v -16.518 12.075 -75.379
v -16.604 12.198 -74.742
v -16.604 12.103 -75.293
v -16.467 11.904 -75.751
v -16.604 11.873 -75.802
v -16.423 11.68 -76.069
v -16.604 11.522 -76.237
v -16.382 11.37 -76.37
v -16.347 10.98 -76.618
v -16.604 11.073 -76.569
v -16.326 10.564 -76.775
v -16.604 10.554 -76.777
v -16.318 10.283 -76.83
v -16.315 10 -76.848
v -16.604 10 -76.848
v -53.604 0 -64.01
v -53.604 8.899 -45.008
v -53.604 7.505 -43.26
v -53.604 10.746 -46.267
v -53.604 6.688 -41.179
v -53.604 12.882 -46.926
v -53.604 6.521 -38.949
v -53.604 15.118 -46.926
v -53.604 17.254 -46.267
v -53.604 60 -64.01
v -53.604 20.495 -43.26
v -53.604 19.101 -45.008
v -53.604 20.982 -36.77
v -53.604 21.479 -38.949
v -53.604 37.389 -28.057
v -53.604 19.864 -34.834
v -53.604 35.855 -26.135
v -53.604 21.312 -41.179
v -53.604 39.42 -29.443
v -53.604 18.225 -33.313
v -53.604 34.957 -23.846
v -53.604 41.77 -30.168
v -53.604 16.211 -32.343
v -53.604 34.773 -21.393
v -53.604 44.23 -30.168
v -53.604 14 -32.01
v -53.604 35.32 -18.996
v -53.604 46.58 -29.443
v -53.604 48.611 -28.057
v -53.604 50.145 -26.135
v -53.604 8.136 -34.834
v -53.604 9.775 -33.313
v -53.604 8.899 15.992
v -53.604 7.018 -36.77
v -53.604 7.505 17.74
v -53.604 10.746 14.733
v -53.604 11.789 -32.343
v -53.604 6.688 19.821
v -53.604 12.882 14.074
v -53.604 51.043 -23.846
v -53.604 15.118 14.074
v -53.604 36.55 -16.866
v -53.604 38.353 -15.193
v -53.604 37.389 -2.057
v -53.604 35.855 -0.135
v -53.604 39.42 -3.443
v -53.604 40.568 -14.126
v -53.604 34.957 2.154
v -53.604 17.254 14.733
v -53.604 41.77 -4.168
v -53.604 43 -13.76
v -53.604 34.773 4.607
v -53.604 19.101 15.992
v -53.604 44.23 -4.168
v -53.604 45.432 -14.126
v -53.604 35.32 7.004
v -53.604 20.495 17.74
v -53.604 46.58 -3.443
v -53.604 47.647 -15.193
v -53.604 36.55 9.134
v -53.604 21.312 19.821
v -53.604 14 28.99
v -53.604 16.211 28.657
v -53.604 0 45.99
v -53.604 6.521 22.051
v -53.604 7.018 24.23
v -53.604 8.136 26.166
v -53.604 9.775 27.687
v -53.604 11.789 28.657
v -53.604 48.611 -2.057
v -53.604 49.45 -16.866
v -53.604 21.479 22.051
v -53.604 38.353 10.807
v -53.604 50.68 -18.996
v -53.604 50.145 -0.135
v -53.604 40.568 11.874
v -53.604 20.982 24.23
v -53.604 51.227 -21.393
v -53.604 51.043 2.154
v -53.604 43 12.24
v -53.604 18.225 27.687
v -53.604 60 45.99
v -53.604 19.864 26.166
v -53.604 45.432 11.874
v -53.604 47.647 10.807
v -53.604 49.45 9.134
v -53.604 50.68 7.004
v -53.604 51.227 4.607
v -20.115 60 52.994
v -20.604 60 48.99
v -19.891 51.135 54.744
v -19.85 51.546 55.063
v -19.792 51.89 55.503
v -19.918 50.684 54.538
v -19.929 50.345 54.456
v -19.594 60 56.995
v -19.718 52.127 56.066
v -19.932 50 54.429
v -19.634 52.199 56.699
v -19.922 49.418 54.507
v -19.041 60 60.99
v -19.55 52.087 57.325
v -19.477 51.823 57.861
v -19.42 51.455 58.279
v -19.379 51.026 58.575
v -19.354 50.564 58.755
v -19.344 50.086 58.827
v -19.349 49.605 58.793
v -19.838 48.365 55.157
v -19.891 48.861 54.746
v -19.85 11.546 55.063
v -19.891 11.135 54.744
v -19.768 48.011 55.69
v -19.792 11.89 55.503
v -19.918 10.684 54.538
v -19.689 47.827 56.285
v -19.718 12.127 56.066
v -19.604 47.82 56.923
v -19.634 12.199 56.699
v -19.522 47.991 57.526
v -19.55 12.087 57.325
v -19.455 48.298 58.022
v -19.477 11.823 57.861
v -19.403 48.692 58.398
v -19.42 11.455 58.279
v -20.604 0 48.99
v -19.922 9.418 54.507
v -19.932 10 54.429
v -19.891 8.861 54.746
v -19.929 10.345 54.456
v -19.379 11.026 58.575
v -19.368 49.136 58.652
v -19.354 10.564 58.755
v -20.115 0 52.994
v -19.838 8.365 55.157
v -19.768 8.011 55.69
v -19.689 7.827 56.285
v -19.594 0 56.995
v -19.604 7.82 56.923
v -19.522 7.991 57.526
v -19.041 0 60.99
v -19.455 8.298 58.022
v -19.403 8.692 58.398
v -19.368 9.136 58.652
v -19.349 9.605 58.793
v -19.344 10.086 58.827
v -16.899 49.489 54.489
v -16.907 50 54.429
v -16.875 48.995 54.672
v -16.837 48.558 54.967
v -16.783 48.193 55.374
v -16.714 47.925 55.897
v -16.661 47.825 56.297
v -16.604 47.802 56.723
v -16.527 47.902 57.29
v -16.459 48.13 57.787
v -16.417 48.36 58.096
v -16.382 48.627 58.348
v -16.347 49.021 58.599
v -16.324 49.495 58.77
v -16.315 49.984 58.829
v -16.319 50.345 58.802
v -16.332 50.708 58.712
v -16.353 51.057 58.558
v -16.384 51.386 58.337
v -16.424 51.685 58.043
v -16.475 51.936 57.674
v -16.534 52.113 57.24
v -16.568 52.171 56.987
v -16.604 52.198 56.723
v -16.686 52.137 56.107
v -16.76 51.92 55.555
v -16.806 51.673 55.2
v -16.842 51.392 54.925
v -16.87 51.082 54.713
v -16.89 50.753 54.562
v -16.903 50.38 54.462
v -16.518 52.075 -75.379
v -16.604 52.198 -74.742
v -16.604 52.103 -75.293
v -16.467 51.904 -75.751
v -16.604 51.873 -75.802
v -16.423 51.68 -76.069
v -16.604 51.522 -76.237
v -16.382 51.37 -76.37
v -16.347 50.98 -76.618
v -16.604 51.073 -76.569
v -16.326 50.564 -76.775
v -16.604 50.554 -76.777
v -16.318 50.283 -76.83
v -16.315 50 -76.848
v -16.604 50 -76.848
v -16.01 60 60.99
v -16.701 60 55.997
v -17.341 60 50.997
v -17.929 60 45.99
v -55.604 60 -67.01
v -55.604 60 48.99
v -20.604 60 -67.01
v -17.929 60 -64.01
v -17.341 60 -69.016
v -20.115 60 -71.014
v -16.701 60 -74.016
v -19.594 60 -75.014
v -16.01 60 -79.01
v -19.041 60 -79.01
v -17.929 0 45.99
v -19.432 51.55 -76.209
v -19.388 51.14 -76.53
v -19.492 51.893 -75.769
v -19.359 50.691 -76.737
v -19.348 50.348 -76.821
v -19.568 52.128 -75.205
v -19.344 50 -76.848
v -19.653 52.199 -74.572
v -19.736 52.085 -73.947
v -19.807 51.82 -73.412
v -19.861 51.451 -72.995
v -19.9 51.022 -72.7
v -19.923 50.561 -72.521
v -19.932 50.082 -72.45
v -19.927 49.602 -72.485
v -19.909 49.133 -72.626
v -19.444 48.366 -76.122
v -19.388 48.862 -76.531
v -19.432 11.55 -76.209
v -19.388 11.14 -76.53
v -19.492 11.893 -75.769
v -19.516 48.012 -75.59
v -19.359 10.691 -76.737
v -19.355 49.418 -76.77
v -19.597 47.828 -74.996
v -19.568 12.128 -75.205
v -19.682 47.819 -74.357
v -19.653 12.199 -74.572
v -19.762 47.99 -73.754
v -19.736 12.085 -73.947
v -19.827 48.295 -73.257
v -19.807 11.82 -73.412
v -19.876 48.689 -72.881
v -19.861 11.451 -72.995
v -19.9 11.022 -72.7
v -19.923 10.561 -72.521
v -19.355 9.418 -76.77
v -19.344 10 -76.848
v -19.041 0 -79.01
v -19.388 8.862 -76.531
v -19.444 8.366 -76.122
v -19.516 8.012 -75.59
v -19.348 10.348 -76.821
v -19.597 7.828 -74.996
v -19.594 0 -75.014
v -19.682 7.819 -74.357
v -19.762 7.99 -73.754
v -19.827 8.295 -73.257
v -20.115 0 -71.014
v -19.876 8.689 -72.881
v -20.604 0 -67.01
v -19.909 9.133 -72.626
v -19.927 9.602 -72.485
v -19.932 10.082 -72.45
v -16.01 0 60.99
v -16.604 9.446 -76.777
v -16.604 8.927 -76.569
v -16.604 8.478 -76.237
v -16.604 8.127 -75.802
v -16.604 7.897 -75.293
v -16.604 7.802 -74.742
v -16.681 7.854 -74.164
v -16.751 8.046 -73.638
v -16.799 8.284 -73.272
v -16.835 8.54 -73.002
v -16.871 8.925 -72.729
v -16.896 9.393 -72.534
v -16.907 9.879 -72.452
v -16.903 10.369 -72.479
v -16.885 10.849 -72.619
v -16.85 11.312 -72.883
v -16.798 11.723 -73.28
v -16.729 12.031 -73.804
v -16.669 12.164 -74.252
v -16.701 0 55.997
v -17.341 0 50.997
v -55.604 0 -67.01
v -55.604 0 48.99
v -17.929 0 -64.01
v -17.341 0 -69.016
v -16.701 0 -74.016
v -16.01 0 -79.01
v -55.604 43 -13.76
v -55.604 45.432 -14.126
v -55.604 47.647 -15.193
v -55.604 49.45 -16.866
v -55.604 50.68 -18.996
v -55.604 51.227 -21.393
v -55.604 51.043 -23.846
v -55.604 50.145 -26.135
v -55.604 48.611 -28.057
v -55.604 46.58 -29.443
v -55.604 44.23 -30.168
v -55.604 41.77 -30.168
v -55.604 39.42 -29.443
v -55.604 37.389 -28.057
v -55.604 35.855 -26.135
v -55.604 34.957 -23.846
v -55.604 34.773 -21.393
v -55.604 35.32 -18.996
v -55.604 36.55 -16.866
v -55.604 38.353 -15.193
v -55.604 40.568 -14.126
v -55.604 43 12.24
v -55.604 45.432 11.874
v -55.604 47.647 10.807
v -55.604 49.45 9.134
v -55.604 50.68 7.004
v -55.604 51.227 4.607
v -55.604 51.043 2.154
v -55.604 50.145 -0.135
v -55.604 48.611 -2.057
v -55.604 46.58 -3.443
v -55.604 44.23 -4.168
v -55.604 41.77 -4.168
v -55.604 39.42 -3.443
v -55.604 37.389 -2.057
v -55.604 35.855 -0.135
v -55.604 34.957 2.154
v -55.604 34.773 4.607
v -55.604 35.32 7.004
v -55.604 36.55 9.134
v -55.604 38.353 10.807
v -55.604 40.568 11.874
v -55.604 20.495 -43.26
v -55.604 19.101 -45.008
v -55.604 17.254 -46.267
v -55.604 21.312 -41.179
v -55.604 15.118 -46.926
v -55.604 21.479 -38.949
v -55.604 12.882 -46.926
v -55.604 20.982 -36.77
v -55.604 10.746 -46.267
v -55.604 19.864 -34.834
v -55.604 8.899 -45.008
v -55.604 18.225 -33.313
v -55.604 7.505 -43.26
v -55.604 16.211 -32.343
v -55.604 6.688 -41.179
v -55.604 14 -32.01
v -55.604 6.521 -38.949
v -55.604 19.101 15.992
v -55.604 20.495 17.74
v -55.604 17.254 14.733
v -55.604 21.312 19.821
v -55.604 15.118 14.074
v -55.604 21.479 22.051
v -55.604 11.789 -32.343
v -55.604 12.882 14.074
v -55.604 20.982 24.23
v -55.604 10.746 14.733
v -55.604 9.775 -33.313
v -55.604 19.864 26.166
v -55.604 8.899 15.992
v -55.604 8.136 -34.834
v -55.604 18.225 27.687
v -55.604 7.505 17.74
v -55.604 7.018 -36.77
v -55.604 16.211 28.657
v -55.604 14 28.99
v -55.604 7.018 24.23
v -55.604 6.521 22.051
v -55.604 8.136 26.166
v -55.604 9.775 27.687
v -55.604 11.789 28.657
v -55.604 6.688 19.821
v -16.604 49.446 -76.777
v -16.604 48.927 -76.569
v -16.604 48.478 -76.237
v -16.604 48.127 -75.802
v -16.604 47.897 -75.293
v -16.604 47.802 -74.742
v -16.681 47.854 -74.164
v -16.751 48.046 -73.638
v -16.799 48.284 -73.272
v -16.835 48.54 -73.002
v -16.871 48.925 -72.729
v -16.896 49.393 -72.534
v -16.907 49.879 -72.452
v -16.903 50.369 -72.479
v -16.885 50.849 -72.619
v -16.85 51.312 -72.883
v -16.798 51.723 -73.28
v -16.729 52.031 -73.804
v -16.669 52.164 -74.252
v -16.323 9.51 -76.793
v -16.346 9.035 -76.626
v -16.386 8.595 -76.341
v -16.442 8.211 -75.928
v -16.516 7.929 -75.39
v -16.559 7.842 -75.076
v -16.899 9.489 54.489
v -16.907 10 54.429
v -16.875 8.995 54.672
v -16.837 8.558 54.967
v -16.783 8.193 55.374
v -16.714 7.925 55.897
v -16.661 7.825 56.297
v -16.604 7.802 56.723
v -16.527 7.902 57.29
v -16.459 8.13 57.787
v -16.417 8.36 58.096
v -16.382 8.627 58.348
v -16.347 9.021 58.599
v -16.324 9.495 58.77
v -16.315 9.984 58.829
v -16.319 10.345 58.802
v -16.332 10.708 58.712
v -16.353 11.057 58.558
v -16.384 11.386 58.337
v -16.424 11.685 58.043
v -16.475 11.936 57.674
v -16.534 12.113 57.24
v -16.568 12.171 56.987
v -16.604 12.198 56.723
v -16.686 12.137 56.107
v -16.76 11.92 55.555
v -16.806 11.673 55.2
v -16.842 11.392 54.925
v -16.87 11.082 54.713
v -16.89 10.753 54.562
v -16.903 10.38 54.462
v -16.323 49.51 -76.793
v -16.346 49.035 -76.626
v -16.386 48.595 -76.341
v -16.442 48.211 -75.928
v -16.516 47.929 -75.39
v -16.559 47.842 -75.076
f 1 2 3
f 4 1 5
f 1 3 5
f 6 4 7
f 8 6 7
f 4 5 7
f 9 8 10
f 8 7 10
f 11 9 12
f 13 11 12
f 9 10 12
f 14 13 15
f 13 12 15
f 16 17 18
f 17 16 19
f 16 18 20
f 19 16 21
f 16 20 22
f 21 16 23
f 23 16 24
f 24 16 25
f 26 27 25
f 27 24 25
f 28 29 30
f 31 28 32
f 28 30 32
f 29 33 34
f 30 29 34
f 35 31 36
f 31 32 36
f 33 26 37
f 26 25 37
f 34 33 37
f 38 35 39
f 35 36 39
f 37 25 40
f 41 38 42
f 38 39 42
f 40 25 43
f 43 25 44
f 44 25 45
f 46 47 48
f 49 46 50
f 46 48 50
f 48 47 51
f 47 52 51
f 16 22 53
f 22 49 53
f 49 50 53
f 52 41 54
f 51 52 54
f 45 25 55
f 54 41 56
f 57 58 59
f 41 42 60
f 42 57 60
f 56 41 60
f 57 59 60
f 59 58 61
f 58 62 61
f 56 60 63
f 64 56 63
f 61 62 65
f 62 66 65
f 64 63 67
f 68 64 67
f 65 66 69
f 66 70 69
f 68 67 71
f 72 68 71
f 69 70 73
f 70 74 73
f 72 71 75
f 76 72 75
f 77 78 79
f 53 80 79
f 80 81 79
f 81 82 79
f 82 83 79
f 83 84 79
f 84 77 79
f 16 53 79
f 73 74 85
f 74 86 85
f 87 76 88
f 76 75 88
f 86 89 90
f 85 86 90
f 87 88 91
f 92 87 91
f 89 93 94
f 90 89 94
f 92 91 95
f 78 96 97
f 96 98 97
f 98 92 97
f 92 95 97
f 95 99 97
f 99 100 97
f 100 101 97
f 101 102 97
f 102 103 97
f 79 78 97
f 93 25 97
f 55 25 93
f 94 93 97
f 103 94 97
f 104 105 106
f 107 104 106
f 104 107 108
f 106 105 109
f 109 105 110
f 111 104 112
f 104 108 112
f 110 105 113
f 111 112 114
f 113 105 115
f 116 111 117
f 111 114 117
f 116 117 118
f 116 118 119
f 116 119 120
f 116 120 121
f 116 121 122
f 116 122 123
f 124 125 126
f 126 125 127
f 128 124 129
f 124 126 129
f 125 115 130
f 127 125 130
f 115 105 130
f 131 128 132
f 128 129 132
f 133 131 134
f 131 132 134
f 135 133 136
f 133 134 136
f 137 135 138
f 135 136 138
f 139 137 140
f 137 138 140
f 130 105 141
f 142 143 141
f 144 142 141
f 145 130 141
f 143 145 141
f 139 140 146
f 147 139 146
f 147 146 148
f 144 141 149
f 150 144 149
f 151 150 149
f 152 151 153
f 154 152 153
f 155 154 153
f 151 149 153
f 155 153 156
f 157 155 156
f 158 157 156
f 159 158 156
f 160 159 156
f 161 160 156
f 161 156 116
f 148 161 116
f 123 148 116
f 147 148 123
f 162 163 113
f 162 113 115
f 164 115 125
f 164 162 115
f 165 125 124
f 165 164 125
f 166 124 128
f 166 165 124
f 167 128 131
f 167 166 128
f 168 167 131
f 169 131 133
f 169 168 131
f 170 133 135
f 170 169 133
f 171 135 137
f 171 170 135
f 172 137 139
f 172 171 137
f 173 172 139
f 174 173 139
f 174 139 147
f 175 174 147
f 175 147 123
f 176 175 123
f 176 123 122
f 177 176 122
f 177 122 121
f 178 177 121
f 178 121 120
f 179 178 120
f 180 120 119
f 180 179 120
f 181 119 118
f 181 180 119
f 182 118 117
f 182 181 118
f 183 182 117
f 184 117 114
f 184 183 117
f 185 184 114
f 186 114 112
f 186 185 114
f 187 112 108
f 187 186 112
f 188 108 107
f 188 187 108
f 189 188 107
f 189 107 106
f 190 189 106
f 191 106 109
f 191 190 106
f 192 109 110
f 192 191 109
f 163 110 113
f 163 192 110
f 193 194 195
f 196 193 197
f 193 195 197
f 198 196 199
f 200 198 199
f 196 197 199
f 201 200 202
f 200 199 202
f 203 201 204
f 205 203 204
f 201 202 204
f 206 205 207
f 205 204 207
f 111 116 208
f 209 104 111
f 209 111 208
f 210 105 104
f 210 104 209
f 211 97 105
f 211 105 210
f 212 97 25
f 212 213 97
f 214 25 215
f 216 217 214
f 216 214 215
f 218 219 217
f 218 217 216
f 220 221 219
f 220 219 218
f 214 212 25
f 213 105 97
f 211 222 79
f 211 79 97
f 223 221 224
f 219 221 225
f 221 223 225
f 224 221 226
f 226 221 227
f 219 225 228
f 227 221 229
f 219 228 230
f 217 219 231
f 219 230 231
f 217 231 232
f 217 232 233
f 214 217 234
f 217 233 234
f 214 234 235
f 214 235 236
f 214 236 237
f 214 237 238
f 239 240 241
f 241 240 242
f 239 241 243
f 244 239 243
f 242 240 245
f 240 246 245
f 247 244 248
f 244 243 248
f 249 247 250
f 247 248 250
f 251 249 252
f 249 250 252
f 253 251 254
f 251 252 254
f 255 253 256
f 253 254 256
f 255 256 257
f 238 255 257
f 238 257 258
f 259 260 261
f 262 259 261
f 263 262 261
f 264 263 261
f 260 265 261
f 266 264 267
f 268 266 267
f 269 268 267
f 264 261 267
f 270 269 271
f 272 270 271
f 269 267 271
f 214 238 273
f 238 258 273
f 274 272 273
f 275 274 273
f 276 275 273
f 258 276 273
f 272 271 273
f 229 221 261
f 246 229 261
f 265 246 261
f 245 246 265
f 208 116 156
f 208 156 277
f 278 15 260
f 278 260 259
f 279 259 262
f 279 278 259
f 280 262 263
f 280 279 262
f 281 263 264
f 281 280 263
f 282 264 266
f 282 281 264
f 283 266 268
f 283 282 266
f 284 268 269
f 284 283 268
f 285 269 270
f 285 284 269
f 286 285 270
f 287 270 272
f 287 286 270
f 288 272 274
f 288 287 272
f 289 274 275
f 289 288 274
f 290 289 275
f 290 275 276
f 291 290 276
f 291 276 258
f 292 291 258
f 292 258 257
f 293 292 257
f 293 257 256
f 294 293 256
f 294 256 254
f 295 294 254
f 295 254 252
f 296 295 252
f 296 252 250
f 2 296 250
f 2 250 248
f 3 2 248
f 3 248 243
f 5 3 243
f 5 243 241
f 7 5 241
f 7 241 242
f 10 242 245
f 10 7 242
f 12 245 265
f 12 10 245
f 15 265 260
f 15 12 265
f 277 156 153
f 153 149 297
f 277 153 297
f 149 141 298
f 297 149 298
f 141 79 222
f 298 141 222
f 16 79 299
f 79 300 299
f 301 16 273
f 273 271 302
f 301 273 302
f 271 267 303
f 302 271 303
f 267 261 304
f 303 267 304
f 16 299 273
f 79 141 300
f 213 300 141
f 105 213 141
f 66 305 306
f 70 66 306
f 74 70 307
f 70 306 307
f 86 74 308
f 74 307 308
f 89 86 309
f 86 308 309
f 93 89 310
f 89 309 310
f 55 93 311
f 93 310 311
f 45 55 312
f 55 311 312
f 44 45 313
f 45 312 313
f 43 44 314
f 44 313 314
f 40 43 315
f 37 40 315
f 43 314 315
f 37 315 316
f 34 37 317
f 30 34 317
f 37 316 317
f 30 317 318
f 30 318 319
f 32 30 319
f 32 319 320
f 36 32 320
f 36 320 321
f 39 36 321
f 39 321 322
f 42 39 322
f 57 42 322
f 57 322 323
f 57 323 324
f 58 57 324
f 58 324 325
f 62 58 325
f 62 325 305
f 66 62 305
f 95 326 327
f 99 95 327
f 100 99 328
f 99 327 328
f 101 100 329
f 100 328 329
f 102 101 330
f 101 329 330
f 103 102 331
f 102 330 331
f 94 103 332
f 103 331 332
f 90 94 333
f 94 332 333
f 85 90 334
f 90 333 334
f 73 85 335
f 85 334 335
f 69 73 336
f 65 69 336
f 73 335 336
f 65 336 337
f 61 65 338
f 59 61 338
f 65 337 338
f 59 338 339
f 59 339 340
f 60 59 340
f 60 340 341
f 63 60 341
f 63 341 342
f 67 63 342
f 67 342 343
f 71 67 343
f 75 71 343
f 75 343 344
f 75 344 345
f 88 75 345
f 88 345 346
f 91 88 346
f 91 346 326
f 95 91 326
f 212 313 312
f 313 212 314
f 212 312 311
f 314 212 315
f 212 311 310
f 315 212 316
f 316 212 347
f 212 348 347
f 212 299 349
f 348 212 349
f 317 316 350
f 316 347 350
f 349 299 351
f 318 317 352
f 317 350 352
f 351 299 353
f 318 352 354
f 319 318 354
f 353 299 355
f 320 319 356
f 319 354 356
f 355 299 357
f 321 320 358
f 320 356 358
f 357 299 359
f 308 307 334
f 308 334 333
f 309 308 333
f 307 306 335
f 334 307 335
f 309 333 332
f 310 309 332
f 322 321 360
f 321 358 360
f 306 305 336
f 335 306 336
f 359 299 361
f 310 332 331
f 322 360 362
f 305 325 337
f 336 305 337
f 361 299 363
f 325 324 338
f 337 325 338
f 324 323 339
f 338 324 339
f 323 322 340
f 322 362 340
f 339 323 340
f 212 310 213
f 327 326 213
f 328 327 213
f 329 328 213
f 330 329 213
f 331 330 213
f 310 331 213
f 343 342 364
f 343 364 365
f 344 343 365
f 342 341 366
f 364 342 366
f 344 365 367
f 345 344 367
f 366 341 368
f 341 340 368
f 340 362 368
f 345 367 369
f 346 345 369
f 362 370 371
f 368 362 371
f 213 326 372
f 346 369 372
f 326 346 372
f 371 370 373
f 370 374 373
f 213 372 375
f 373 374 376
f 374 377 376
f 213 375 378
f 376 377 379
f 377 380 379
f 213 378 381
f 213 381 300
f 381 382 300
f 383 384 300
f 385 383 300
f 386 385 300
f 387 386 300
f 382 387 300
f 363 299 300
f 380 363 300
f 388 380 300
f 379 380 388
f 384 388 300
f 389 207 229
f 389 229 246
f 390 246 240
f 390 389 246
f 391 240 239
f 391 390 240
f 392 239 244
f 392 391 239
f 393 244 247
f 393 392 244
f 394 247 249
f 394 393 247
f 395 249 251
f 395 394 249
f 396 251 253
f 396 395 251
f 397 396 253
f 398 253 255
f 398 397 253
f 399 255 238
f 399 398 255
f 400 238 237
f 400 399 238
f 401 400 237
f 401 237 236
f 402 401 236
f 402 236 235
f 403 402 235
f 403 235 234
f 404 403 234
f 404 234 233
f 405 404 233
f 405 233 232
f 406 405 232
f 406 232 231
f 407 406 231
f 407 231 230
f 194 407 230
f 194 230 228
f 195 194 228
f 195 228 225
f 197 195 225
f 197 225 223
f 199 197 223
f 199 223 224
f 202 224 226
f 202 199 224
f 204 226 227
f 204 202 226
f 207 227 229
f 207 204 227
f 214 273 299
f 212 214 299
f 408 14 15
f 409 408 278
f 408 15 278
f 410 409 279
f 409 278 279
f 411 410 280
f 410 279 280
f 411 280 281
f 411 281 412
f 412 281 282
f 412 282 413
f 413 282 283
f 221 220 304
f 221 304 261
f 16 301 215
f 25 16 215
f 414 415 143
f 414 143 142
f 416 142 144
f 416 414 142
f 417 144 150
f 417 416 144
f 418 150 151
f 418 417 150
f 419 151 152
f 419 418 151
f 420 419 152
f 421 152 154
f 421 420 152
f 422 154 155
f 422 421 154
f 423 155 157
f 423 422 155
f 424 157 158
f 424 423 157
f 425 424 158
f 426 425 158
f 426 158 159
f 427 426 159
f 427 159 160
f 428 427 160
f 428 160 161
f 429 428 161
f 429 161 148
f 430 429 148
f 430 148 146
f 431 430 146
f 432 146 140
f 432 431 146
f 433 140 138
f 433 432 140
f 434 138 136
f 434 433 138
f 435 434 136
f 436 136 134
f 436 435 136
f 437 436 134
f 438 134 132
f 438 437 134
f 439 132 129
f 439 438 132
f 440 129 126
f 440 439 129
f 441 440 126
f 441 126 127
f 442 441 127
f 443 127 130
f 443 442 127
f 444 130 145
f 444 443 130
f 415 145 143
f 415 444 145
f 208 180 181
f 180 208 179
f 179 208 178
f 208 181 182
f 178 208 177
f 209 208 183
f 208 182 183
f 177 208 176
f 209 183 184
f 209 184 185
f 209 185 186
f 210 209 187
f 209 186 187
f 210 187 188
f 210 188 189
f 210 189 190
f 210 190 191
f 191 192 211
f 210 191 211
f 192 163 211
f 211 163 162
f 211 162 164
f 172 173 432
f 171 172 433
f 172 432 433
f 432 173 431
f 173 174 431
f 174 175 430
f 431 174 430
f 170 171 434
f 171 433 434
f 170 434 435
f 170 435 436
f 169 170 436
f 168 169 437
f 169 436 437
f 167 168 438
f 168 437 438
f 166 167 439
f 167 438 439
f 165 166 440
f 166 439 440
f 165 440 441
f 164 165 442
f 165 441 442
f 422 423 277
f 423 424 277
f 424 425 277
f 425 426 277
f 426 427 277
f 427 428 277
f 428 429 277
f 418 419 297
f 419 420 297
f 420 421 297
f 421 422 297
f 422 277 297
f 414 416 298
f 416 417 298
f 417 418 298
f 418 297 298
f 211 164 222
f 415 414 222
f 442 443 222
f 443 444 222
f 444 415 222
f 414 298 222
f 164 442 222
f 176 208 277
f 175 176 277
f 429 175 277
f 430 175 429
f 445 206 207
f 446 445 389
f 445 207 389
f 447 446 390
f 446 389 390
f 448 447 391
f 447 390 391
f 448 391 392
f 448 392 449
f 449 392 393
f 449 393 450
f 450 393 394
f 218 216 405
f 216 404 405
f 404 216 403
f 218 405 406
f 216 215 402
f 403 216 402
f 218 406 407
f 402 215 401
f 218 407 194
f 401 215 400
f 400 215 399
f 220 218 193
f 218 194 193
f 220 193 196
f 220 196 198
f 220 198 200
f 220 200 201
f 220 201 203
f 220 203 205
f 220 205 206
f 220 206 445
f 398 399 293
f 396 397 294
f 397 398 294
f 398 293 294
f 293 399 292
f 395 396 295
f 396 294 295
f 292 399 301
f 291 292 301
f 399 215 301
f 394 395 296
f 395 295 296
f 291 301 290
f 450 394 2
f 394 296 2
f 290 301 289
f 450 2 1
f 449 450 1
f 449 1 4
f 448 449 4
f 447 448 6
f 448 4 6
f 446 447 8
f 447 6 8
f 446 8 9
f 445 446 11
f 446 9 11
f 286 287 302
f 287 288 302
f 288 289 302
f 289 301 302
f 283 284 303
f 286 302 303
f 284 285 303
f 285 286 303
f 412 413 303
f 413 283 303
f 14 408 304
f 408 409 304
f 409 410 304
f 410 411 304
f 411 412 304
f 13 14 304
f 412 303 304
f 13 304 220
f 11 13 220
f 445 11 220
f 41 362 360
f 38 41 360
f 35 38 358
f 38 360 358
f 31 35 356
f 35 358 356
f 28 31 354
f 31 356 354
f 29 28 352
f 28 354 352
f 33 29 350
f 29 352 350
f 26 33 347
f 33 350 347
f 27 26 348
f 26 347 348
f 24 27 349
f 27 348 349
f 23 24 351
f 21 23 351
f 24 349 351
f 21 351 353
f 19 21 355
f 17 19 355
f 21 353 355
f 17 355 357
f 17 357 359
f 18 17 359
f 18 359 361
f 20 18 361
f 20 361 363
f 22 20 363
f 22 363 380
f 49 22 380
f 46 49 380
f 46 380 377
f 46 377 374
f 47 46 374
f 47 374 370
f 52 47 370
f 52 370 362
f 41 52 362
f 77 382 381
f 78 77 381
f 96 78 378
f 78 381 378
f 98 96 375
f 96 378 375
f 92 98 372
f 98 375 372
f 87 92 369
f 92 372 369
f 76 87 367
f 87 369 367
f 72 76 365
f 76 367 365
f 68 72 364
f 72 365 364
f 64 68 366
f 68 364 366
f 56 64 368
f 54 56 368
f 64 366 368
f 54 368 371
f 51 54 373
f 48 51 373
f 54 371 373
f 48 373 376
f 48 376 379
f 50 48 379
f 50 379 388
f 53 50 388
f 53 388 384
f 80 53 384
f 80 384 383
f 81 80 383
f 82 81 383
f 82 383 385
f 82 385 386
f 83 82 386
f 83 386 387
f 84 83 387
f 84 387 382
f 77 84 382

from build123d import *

# Parameters (mm, degrees)
EXTRUDE_1_DEPTH     = 60
SKETCH_3_W          = 110
SKETCH_3_H          = 60
CUT_EXTRUDE_1_DEPTH = 37
SKETCH_4_R          = 7.5
SKETCH_4_R_2        = 8.25
CUT_EXTRUDE_2_DEPTH = 5
SKETCH_7_R          = 2.2
CUT_EXTRUDE_3_DEPTH = 20
SKETCH_7_2_R        = 2.2
CUT_EXTRUDE_4_DEPTH = 9


with BuildPart() as part:
    # Sketch 2 → Extrude 1 (new body)
    with BuildSketch(Plane(origin=(0, 0, 0), x_dir=(1, 0, 0), z_dir=(0, 1, 0))):
        with BuildLine():
            Line((-19.040504883, -60.990225421), (-16.009924796, -60.990225421))
            ThreePointArc((-16.009924796, -60.990225421), (-19.758334463, -26.07939754), (-21.009924796, 9.009774579))
            ThreePointArc((-21.009924796, 9.009774579), (-19.758334463, 44.098946698), (-16.009924796, 79.009774579))
            Line((-16.009924796, 79.009774579), (-19.040504883, 79.009774579))
            ThreePointArc((-19.040504883, 79.009774579), (-19.858720594, 73.014546807), (-20.603665866, 67.009774579))
            Line((-20.603665866, 67.009774579), (-55.603665866, 67.009774579))
            Line((-55.603665866, 67.009774579), (-55.603665866, -48.990225421))
            Line((-55.603665866, -48.990225421), (-20.603665866, -48.990225421))
            ThreePointArc((-20.603665866, -48.990225421), (-19.858720594, -54.99499765), (-19.040504883, -60.990225421))
        make_face()
    extrude(amount=EXTRUDE_1_DEPTH)

    # Sketch 3 → Cut-Extrude 1 (cut)
    with BuildSketch(Plane.ZY.offset(16.603665866)):
        with Locations((-9.009774579, 30)):
            Rectangle(SKETCH_3_W, SKETCH_3_H)
    extrude(amount=CUT_EXTRUDE_1_DEPTH, mode=Mode.SUBTRACT)

    # Sketch 4 → Cut-Extrude 2 (cut)
    with BuildSketch(Plane.ZY.offset(55.603665866)):
        with Locations((21.490225421, 14)):
            Circle(SKETCH_4_R)
        with Locations((-39.509774579, 14)):
            Circle(SKETCH_4_R)
        with Locations((3.990225421, 43)):
            Circle(SKETCH_4_R_2)
        with Locations((-22.009774579, 43)):
            Circle(SKETCH_4_R_2)
    extrude(amount=-CUT_EXTRUDE_2_DEPTH, mode=Mode.SUBTRACT)

    # Sketch 7 → Cut-Extrude 3 (cut)
    with BuildSketch(Plane.ZY.offset(16.603665866)):
        with Locations(Location((-74.648328965, 50, 0), (0, 0, 180))):  # turned: the seam where the file's is
            Circle(SKETCH_7_R)
        with Locations(Location((-74.648328965, 10, 0), (0, 0, 180))):  # turned: the seam where the file's is
            Circle(SKETCH_7_R)
        with Locations(Location((56.628779808, 50, 0), (0, 0, 180))):  # turned: the seam where the file's is
            Circle(SKETCH_7_R)
        with Locations(Location((56.628779808, 10, 0), (0, 0, 180))):  # turned: the seam where the file's is
            Circle(SKETCH_7_R)
    extrude(amount=CUT_EXTRUDE_3_DEPTH, mode=Mode.SUBTRACT)

    # Sketch 7_2 → Cut-Extrude 4 (cut)
    with BuildSketch(Plane.ZY.offset(16.603665866)):
        with Locations(Location((-74.648328965, 50, 0), (0, 0, 180))):  # turned: the seam where the file's is
            Circle(SKETCH_7_2_R)
        with Locations(Location((-74.648328965, 10, 0), (0, 0, 180))):  # turned: the seam where the file's is
            Circle(SKETCH_7_2_R)
        with Locations(Location((56.628779808, 50, 0), (0, 0, 180))):  # turned: the seam where the file's is
            Circle(SKETCH_7_2_R)
        with Locations(Location((56.628779808, 10, 0), (0, 0, 180))):  # turned: the seam where the file's is
            Circle(SKETCH_7_2_R)
    extrude(amount=-CUT_EXTRUDE_4_DEPTH, mode=Mode.SUBTRACT)


solid = part.part
